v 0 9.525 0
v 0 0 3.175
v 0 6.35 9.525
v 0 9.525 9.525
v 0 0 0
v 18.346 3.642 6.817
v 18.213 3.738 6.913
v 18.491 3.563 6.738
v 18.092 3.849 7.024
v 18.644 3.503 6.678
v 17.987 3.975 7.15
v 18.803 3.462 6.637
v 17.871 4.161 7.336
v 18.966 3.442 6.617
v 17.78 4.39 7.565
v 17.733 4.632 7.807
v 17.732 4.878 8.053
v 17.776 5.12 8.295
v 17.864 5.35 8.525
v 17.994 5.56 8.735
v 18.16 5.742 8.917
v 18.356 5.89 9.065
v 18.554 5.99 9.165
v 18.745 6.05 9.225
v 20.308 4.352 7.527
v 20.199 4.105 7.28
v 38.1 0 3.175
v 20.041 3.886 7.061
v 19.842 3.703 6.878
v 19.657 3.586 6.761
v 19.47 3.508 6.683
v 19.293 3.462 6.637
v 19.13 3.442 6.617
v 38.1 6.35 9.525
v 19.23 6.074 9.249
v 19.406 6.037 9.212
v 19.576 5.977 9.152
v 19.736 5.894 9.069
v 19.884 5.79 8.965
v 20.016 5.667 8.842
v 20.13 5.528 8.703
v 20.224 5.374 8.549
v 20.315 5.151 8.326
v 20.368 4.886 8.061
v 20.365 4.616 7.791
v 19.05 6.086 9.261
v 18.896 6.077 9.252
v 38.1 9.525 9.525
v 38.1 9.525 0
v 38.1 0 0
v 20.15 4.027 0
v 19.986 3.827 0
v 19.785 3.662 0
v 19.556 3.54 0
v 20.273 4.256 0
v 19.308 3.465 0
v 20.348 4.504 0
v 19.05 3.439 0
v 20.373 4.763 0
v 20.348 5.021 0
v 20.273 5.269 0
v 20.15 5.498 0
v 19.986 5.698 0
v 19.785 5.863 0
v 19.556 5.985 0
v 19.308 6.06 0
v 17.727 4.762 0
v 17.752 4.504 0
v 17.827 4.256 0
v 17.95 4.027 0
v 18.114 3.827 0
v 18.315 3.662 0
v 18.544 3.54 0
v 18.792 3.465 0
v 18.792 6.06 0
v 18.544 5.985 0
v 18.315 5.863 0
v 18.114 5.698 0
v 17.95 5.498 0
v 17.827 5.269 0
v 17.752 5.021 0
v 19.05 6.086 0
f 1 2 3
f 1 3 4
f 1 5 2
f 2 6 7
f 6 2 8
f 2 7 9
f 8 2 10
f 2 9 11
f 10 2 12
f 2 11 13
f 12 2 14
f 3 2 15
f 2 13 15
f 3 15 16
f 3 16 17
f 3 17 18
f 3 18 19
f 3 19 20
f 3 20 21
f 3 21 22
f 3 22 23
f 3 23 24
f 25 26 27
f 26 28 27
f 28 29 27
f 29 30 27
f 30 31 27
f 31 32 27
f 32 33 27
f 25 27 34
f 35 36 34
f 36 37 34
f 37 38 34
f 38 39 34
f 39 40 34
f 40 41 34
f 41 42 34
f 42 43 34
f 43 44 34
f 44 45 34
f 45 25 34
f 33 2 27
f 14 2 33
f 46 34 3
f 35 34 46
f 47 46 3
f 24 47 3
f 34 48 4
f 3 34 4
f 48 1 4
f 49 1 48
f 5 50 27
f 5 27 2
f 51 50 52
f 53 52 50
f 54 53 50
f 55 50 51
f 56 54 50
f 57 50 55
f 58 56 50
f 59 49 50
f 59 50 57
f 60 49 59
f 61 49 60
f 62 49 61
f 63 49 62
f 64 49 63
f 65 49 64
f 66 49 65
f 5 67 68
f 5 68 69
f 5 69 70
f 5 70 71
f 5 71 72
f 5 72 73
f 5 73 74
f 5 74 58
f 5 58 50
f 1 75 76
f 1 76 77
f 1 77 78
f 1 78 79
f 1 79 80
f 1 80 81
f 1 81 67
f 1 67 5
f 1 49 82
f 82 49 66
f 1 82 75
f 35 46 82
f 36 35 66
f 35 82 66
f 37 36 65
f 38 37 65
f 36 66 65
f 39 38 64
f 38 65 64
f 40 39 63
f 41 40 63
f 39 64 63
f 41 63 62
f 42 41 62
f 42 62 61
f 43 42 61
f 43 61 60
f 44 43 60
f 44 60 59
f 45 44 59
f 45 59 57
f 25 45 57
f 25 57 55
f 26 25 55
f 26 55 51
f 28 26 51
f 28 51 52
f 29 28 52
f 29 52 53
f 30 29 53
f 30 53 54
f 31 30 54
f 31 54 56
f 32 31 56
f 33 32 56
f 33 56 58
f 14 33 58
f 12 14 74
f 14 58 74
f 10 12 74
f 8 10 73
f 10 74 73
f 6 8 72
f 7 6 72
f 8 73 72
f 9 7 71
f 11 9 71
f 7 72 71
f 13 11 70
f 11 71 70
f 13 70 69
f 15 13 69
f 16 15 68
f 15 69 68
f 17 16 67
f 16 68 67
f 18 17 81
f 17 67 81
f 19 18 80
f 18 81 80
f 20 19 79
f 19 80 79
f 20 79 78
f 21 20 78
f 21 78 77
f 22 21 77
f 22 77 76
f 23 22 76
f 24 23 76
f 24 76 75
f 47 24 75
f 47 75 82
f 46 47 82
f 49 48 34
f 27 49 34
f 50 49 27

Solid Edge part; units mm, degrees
sketch "Sketch1" plane through (0, 0, 0) normal (0, 0, 1) x (1, 0, 0)
  line L0 (0, 0) -> (0, 9.525)
  line L1 (0, 9.525) -> (38.1, 9.525)
  line L2 (38.1, 9.525) -> (38.1, 0)
  line L3 (38.1, 0) -> (0, 0)
  dimension "D1" = 9.525
  dimension "D2" = 38.1
extrude "Protrusion1" add sketch "Sketch1" along normal blind 9.525
hole "Hole_1" at (19.05, 4.7625, 0) direction (0, 0, 1) diameter 2.6467 end up to next
chamfer "Chamfer_1" distance 6.35 angle 45 1 edges at (19.05, 0, 9.525)
